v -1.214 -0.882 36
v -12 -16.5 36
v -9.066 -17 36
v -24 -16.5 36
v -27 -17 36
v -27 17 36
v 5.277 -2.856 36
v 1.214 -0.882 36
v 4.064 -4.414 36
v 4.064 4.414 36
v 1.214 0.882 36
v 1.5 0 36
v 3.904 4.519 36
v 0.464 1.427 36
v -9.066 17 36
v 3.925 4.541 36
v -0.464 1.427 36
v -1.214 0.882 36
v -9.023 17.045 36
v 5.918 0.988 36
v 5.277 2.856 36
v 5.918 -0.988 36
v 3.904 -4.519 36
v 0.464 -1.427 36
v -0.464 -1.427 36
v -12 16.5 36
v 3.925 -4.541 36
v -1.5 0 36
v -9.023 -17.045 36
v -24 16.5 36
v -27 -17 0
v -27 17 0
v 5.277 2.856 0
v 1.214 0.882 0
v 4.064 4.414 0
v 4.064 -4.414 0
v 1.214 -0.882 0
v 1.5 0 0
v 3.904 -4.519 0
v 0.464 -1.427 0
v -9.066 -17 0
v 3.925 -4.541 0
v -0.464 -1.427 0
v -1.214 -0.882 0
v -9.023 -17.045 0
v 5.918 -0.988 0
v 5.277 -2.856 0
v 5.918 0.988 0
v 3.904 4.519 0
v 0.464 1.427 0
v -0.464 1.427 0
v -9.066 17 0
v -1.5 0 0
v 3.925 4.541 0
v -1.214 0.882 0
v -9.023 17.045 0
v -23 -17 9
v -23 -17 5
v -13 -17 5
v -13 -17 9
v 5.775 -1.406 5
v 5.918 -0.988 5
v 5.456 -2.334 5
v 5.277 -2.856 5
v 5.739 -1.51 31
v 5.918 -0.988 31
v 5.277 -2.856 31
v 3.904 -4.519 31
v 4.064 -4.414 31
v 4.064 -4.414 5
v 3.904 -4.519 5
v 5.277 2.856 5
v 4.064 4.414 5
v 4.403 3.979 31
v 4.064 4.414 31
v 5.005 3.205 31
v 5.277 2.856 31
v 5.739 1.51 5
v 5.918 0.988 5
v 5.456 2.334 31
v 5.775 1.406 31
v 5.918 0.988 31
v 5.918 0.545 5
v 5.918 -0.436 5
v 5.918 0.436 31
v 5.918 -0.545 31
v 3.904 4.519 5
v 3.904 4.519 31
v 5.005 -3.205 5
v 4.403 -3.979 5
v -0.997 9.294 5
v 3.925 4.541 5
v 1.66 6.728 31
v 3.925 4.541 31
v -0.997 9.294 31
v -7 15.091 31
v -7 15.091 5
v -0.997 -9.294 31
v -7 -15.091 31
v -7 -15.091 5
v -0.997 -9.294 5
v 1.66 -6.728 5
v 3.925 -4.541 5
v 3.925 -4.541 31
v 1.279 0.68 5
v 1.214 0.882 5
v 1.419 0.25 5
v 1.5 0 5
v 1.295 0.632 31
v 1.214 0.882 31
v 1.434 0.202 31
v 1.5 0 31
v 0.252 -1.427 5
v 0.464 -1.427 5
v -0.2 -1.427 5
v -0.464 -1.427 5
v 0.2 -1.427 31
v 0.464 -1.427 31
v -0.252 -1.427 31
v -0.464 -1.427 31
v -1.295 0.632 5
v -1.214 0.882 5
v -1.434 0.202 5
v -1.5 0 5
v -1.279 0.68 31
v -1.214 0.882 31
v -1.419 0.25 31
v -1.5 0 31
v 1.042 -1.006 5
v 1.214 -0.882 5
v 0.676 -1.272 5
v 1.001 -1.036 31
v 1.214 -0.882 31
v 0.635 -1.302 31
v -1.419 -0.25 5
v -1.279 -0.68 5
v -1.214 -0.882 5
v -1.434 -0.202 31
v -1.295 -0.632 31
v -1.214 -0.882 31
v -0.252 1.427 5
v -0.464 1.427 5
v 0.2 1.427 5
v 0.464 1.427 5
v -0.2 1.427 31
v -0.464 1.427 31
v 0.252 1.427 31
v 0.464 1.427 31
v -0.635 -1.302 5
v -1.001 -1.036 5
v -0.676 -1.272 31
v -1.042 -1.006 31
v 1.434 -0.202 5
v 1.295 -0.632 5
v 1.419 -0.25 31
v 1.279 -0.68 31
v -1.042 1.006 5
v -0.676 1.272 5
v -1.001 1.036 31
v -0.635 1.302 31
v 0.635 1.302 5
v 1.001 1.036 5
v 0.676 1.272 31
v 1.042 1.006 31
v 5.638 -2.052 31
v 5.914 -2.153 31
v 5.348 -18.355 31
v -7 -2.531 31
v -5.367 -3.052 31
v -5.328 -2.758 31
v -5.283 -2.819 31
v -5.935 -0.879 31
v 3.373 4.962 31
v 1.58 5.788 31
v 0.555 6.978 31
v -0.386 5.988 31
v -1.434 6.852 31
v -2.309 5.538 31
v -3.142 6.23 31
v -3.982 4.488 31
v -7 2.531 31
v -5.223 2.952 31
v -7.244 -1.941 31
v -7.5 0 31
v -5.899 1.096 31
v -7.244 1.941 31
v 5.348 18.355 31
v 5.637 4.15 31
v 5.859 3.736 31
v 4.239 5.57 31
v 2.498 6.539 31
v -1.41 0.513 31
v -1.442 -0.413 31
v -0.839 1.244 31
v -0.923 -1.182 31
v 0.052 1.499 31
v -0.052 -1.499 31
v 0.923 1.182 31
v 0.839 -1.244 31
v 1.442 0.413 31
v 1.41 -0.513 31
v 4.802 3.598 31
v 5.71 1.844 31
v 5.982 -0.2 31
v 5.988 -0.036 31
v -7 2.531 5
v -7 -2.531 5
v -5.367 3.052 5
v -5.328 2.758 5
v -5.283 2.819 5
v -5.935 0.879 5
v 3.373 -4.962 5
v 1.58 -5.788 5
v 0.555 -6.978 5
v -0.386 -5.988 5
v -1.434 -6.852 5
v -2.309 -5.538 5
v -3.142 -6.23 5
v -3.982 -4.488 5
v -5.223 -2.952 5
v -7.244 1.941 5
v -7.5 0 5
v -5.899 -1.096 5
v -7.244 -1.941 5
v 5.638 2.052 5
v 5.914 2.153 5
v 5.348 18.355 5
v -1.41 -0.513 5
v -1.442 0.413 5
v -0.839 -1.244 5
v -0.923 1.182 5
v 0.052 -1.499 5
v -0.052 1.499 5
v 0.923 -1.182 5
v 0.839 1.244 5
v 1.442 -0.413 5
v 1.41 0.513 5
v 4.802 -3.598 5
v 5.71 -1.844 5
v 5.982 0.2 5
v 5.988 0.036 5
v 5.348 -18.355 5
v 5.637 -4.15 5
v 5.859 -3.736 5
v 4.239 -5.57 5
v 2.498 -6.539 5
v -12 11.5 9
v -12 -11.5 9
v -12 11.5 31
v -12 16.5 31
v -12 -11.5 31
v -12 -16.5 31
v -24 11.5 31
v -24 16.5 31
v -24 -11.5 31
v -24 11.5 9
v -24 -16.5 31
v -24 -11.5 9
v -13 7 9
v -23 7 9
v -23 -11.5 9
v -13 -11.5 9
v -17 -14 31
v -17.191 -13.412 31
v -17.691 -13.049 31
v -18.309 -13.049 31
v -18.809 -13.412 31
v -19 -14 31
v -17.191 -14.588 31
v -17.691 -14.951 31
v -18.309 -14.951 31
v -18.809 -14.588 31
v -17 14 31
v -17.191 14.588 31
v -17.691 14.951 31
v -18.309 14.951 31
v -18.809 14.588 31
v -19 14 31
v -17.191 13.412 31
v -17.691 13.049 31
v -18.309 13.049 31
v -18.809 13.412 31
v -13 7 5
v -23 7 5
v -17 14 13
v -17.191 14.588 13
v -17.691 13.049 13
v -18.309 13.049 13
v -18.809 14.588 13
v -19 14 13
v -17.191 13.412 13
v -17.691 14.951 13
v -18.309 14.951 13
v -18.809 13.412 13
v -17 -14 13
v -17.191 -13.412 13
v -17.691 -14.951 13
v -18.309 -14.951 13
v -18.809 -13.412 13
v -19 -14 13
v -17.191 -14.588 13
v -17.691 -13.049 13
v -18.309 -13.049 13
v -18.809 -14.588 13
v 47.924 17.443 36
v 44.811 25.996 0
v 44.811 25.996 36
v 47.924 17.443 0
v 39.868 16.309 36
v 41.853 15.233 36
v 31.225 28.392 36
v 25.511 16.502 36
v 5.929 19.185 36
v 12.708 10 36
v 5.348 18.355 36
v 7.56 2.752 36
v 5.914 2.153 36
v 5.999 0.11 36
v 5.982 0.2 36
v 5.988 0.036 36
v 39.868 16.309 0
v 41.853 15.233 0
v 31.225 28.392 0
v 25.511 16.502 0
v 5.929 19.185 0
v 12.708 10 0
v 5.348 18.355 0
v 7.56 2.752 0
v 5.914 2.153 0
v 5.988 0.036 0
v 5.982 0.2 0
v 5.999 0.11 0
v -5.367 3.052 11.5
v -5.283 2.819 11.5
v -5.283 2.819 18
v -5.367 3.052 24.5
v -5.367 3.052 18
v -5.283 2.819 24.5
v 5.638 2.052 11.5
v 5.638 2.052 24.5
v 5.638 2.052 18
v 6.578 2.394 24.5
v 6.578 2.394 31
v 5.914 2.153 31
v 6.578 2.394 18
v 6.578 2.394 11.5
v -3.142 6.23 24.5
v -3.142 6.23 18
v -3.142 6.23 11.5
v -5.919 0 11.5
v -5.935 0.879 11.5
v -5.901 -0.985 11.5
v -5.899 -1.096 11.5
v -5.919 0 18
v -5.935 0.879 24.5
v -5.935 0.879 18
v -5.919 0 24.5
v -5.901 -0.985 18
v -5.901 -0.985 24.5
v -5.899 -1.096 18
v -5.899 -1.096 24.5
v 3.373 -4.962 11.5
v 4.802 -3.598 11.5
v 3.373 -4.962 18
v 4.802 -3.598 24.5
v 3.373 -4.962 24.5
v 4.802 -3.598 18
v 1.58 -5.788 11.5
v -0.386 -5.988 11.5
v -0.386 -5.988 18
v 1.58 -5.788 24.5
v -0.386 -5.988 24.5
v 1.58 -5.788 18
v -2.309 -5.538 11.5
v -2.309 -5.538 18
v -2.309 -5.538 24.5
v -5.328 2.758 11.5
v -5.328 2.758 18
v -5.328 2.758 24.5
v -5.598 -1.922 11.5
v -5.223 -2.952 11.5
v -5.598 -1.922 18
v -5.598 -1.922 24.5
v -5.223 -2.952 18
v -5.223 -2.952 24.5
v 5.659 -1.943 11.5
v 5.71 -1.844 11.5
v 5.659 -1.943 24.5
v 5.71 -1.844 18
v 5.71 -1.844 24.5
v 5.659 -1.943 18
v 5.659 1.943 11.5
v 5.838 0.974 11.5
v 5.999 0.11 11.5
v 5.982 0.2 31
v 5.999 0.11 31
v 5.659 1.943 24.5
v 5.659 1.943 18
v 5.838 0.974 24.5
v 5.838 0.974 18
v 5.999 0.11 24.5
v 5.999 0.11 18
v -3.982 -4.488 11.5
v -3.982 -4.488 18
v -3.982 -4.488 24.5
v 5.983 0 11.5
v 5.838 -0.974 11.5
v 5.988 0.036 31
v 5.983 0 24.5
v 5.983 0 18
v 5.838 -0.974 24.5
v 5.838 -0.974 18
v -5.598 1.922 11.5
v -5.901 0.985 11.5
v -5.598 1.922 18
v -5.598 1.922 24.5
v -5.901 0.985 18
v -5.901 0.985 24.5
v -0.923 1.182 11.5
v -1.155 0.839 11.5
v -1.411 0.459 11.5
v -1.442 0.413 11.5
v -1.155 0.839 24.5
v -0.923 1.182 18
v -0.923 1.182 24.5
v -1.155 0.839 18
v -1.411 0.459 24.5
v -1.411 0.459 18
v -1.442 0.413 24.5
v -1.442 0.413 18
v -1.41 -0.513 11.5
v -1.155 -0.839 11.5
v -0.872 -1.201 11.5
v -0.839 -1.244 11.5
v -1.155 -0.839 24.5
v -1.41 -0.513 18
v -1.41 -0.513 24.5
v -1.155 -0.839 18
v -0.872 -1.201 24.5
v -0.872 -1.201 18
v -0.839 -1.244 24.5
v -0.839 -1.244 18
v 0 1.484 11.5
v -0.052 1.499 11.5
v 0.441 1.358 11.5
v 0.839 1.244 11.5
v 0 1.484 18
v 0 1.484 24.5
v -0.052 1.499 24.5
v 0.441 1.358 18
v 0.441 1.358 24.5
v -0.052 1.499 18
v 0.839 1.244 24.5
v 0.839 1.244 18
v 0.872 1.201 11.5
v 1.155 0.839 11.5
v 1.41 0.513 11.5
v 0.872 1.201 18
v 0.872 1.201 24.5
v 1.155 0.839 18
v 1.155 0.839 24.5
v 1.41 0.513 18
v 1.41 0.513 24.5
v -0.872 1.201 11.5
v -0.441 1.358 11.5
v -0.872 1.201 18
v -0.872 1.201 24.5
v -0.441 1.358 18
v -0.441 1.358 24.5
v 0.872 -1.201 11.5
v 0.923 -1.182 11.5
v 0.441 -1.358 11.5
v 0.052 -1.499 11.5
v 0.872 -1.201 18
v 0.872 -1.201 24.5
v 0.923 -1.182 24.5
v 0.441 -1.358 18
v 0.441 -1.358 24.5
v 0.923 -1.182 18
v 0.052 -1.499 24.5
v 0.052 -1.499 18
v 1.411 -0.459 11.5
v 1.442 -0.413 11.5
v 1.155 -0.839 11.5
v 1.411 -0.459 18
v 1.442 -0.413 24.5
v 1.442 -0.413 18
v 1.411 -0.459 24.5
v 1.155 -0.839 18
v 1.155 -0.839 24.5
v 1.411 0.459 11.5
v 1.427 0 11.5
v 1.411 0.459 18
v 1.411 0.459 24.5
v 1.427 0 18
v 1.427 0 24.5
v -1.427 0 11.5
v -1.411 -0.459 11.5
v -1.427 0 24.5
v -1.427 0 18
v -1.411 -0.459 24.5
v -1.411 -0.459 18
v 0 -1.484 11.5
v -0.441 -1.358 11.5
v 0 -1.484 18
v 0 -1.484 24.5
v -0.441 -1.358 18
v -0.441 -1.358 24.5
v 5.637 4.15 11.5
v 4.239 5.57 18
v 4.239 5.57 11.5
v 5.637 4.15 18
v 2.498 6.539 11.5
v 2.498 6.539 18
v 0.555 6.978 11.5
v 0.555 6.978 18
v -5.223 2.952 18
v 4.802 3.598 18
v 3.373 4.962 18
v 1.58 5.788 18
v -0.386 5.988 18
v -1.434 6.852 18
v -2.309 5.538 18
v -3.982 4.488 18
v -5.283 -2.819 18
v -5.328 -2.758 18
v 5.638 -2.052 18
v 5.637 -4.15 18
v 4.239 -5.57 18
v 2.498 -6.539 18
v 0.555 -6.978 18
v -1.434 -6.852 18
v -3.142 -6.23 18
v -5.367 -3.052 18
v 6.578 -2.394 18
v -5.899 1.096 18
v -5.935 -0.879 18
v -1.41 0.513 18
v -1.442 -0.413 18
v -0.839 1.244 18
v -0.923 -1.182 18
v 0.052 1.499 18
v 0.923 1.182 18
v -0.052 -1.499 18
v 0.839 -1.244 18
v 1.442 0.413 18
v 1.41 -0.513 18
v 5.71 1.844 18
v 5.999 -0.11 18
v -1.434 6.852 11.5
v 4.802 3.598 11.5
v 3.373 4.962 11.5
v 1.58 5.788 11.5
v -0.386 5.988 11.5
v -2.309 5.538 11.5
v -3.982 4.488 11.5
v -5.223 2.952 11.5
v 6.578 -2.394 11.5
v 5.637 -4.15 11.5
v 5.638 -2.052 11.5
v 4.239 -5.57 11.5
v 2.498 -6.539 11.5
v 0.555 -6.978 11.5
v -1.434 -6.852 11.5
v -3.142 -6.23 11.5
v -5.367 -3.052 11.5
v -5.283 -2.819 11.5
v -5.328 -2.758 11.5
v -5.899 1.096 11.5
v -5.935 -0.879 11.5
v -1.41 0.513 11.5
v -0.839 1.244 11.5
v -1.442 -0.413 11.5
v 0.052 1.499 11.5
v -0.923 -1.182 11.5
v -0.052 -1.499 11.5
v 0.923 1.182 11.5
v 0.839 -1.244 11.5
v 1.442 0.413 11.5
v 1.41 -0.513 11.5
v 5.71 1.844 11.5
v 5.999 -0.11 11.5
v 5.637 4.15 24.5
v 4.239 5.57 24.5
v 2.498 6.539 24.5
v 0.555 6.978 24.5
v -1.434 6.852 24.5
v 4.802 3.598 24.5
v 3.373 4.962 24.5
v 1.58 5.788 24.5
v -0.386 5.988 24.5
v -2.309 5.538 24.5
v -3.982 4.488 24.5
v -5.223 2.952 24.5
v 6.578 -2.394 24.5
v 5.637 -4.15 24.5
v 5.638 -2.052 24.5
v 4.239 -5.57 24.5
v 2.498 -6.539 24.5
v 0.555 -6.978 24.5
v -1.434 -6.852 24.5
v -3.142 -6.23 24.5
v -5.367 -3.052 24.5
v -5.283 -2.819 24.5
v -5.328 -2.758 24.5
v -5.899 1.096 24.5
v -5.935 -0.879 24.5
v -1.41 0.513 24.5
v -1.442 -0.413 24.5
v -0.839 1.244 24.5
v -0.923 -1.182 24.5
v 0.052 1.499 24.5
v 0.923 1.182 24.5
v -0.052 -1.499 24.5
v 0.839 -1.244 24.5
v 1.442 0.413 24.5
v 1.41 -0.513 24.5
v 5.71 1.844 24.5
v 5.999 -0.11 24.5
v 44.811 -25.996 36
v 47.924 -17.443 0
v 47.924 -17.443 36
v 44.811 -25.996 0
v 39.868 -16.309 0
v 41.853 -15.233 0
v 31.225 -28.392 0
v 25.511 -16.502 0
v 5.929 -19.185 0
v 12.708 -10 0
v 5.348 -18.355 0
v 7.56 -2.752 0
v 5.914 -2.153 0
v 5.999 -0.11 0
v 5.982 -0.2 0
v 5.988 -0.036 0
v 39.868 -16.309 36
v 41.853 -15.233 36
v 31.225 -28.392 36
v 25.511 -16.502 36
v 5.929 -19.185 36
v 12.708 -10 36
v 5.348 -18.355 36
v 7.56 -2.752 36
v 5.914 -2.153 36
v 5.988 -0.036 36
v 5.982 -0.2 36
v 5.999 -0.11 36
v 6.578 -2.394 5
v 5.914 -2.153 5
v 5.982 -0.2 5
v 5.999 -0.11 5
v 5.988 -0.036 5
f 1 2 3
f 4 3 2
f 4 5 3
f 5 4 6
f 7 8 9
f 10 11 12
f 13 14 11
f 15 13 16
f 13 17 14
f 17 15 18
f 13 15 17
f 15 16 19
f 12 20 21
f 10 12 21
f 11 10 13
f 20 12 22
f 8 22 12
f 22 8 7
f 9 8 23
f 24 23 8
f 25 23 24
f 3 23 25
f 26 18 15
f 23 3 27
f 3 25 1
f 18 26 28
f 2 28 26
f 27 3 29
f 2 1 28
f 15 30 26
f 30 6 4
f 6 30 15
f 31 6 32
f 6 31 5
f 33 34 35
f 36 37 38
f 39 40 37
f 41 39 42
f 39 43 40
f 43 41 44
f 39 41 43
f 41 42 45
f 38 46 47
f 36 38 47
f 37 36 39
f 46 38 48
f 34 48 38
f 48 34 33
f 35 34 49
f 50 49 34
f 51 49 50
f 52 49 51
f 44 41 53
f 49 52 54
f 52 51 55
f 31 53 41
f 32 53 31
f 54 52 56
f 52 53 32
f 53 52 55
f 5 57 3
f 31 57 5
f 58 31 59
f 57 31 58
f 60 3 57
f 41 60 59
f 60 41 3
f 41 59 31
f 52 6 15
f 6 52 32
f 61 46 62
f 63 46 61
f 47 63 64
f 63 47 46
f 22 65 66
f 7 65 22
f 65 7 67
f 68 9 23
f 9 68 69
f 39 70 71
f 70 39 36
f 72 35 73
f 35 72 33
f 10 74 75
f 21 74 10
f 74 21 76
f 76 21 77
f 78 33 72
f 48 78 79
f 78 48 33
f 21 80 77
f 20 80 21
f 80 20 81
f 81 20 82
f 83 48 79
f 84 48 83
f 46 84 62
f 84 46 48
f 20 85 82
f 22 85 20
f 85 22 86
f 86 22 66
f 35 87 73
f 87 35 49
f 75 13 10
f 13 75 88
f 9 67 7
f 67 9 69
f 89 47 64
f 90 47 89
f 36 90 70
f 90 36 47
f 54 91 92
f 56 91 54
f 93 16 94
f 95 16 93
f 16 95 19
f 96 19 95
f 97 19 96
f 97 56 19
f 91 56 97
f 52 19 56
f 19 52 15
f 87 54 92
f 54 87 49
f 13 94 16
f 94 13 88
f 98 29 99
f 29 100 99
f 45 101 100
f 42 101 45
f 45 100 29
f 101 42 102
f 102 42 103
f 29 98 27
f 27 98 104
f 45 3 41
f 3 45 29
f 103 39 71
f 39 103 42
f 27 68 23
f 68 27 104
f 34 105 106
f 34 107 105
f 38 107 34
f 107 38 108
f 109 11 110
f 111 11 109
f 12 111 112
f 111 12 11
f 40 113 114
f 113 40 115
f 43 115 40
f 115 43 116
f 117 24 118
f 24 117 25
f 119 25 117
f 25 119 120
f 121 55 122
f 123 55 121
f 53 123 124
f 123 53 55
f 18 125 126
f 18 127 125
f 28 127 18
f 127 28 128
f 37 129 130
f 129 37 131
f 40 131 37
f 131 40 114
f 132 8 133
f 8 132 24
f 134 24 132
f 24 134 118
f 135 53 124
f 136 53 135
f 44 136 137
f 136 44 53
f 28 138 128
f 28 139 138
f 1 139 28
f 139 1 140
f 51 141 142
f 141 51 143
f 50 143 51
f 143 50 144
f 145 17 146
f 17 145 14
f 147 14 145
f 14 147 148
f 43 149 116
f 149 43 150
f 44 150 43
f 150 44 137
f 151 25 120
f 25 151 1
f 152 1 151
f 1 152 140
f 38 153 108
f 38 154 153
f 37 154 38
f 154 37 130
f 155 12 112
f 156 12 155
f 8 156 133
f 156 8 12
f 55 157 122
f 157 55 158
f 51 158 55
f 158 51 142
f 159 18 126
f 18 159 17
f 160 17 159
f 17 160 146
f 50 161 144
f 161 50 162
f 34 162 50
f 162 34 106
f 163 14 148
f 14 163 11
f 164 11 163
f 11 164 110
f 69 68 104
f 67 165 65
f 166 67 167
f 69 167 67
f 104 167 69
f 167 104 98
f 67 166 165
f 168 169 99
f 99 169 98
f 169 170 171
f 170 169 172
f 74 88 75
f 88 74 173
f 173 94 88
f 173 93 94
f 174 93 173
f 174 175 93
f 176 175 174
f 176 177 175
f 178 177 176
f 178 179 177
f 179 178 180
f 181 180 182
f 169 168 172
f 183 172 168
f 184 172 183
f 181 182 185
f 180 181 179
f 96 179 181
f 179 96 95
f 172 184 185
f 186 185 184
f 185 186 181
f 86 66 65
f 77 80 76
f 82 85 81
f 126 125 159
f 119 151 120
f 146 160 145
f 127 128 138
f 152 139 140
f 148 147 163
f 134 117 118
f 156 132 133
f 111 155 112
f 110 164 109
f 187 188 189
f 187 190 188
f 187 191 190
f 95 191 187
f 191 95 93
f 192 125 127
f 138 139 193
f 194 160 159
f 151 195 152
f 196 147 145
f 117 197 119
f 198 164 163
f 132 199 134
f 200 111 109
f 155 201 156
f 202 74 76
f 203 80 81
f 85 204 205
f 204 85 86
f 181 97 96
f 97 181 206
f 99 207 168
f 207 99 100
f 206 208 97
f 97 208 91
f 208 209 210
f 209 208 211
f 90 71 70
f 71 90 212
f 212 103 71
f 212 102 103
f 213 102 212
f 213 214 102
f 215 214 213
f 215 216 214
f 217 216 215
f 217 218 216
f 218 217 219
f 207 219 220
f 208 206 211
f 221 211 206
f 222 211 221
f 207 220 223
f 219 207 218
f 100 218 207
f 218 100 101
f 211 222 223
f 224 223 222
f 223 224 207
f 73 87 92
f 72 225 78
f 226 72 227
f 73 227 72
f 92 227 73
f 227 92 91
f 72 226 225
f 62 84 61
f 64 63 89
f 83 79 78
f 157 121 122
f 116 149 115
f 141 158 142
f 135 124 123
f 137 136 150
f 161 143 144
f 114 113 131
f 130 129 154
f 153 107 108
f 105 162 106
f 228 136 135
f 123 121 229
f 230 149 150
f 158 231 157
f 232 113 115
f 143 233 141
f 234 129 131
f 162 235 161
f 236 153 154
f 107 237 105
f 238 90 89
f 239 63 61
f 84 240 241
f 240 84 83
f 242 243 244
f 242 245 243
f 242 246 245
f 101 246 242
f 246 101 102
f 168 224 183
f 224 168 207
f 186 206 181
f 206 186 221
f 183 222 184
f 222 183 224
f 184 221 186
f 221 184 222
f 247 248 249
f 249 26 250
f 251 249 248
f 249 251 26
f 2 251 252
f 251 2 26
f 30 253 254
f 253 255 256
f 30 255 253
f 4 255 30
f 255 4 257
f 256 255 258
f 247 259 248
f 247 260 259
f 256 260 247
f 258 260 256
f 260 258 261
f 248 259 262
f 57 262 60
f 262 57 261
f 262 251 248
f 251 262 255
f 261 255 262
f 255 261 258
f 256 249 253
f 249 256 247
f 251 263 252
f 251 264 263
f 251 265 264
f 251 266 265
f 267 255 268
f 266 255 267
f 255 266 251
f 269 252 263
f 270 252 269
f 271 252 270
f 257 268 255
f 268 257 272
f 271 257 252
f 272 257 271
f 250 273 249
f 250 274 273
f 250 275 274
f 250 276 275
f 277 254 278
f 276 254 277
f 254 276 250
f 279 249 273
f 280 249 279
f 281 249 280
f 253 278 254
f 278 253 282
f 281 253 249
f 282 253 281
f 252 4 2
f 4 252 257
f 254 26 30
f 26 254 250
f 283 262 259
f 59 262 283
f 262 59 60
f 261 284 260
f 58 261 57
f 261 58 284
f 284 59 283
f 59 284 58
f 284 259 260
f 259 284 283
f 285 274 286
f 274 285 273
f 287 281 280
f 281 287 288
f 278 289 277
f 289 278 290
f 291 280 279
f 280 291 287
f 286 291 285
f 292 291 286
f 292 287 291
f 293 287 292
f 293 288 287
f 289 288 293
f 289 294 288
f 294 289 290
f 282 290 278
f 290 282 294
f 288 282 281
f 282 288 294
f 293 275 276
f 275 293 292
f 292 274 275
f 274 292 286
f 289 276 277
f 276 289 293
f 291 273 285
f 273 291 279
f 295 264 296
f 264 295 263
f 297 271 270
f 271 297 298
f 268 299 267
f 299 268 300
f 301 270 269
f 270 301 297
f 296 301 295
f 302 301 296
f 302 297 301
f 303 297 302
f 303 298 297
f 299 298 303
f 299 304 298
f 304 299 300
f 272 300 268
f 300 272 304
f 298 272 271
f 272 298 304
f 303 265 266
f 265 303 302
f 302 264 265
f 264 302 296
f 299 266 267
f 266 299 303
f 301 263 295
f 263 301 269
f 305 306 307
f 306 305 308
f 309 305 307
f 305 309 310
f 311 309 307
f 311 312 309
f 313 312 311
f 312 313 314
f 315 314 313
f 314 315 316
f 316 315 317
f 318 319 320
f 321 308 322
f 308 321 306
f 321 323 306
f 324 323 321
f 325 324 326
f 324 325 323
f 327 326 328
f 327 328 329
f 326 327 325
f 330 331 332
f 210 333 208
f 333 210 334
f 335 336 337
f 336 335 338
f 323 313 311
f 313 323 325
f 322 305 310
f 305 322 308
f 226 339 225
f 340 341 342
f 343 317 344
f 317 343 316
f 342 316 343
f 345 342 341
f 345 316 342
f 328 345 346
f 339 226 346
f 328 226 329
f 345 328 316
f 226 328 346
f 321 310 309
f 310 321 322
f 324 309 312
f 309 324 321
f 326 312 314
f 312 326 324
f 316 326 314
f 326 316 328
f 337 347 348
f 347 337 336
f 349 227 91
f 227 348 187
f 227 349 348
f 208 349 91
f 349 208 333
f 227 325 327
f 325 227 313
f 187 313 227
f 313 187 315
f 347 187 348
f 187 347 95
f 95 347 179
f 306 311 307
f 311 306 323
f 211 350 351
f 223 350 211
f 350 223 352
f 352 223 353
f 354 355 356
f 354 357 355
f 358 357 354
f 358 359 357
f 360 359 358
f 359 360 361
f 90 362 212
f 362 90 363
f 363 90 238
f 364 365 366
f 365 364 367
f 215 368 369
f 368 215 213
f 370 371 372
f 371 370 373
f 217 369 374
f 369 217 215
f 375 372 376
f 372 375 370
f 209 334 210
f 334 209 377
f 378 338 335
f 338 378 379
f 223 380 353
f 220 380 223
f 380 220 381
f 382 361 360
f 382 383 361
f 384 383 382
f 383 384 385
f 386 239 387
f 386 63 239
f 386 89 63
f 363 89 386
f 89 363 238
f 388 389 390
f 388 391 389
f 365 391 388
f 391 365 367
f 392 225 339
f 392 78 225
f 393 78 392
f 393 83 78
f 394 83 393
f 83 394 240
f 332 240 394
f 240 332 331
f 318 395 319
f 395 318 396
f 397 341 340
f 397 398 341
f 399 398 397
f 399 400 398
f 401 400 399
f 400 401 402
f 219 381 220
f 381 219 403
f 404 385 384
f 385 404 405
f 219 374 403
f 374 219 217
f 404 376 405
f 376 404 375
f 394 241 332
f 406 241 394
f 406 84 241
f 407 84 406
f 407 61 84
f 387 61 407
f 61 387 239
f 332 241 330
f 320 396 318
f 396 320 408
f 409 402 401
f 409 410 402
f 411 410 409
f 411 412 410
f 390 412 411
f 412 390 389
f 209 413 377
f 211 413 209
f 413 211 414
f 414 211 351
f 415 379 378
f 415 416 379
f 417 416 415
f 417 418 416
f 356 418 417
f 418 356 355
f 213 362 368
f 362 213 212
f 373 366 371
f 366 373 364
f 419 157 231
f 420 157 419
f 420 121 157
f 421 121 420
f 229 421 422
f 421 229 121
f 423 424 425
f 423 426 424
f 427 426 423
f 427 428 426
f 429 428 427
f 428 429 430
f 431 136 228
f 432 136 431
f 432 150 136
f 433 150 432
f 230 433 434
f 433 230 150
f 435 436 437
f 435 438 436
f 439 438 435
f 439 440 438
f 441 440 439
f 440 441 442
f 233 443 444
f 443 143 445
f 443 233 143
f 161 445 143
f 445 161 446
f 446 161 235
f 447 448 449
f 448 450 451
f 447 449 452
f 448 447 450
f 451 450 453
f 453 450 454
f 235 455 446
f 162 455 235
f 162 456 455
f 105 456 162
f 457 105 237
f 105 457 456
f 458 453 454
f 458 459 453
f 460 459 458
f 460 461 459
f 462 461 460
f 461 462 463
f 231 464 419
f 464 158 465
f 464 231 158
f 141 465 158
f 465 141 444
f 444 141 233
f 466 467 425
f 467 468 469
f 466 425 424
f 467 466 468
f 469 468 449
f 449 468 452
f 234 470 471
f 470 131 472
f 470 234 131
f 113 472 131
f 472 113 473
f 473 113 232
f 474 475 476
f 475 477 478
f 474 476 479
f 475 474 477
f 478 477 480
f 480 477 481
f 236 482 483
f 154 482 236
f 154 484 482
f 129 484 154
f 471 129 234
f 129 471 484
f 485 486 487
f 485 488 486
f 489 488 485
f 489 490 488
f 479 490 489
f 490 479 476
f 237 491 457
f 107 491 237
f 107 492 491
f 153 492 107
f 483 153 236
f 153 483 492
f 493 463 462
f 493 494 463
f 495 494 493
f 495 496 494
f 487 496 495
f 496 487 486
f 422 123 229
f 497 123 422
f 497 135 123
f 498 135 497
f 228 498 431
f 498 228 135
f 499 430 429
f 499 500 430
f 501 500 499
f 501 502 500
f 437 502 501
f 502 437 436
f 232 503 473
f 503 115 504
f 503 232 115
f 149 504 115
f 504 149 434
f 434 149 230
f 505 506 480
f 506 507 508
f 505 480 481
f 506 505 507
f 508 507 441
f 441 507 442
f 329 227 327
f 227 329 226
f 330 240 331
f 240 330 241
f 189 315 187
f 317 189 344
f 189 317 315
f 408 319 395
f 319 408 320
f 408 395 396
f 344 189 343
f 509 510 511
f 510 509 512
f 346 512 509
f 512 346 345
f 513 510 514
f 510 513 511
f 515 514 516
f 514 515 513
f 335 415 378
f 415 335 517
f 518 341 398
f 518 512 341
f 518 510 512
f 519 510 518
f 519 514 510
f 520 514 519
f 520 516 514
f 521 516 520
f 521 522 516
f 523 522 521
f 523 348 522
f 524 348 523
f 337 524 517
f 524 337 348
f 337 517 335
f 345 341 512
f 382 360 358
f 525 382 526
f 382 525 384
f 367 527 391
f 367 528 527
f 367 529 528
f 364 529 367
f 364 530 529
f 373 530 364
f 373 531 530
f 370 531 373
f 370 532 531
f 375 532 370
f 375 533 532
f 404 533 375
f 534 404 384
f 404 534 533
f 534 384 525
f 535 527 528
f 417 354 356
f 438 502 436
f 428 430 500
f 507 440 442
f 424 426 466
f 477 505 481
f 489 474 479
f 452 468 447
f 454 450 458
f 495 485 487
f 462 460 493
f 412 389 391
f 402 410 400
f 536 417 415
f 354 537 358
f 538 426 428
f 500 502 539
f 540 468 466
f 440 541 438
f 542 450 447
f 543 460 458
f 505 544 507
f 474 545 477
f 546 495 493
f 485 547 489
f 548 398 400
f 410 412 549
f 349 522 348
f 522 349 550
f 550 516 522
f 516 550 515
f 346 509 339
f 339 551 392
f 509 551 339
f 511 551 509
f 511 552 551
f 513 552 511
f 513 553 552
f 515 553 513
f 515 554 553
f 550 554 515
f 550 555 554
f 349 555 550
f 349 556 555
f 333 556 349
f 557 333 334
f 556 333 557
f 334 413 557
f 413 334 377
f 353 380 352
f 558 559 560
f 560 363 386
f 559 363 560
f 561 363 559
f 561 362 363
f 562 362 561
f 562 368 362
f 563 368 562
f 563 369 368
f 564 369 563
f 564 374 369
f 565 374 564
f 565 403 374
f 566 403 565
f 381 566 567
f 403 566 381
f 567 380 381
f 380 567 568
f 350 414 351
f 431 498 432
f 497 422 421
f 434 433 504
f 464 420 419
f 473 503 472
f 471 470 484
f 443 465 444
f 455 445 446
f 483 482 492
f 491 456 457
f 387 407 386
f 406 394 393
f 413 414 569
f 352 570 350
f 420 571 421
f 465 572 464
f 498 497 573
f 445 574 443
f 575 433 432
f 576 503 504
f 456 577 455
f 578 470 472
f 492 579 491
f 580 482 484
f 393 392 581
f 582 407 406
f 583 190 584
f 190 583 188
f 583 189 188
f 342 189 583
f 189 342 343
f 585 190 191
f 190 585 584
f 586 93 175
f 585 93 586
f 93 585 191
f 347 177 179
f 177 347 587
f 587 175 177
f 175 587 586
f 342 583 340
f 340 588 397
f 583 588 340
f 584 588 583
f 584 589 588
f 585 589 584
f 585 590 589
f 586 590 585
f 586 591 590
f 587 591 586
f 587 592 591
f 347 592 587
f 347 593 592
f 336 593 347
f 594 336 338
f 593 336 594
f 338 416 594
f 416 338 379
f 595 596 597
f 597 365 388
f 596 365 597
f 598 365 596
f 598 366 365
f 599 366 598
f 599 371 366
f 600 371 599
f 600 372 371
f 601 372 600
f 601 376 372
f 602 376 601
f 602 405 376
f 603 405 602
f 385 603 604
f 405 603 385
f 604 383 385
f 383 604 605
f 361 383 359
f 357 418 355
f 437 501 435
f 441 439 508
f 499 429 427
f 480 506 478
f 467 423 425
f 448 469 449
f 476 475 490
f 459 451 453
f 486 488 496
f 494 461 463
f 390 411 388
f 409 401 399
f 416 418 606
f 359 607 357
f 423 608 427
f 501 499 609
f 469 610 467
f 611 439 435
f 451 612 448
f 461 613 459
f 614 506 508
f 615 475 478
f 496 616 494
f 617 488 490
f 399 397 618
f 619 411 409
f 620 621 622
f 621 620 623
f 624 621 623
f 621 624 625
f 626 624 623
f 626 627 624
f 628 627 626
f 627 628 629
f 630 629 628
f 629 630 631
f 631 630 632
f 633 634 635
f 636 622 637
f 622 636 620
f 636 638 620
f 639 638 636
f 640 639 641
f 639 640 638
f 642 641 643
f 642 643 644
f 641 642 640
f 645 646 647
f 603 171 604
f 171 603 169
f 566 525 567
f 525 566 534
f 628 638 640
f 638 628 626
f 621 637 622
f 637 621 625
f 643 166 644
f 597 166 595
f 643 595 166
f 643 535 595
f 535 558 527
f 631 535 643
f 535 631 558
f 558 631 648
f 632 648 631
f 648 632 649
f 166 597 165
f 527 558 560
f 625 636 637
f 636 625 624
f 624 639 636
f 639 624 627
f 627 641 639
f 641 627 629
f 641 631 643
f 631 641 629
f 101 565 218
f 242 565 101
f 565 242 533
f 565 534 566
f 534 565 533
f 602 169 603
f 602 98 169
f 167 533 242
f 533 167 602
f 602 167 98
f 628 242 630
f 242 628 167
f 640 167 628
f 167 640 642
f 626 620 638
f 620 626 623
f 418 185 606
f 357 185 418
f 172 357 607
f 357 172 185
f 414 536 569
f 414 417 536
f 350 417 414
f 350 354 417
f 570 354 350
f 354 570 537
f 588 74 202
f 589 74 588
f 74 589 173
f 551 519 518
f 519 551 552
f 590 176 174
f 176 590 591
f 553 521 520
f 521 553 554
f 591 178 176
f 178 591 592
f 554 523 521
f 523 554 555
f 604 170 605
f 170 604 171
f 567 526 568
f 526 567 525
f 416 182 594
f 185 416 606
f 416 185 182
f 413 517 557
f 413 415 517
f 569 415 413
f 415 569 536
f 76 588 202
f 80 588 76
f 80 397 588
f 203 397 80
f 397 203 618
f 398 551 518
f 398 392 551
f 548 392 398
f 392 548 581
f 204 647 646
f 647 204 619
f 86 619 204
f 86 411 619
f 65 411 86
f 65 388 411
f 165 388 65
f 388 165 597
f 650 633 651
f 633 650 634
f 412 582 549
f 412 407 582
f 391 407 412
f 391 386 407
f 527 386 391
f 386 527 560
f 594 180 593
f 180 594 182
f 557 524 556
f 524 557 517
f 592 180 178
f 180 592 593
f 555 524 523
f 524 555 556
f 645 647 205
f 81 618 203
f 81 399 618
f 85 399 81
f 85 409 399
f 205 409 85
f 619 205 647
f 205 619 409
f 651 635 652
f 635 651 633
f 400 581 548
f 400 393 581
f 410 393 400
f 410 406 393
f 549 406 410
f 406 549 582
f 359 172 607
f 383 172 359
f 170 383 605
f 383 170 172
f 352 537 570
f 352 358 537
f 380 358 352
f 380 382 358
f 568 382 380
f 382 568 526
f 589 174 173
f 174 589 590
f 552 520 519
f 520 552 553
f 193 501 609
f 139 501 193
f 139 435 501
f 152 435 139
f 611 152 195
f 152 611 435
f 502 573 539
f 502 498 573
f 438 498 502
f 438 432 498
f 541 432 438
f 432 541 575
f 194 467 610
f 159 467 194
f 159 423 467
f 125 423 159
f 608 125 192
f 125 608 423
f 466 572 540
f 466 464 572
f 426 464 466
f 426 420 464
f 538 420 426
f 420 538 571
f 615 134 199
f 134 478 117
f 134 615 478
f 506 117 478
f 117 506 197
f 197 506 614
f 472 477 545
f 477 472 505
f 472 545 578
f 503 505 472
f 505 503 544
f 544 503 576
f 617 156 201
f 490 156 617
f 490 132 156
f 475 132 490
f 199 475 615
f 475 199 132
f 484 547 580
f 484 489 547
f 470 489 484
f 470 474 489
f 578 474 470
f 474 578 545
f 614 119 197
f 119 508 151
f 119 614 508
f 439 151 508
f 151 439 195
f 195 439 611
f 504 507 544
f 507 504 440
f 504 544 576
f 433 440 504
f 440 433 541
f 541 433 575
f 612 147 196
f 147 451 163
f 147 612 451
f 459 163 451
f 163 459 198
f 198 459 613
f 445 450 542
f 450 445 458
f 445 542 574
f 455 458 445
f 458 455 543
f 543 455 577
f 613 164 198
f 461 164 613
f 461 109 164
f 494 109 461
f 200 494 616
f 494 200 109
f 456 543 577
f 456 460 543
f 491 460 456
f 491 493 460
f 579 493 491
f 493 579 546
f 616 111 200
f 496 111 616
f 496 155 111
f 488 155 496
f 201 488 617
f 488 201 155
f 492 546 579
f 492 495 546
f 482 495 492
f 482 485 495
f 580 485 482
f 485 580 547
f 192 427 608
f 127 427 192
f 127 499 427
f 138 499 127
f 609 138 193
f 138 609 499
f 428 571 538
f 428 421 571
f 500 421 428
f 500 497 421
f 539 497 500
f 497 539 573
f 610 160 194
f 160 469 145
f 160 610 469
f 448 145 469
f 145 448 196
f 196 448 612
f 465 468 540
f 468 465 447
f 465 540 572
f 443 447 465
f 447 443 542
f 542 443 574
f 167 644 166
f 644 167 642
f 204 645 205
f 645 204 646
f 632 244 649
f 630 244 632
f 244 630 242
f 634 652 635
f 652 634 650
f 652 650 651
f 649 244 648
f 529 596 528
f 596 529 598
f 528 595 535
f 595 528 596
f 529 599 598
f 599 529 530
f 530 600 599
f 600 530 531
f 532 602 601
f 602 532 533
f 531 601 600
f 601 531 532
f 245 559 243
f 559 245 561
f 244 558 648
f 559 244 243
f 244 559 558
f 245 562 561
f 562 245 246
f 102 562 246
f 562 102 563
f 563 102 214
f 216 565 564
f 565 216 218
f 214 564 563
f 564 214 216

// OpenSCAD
module base(){union(){
difference(){
	union(){
		cube([36,34,18]);
		translate([0,17,27])rotate([0,90,0])cylinder(r=6, h=36);

		translate([0,16.5,2])rotate([46,0,0])cube([36,18,23]);
		mirror([0,1,0])translate([0,-17.5,2])rotate([46,0,0])cube([36,18,23]);
	}
		translate([-1,17,27])rotate([0,90,0])cylinder(r=1.5, h=38, $fn=10);
		translate([5,0,20])cube([26,40,40]);
		translate([5,17,27])rotate([0,90,0])cylinder(r=7.5, h=26);
		translate([36-27,5.5,3])cube([36,23,12]);
		translate([36-5,0.5,3])cube([36,33,12]);
		translate([5,10,4])cube([4,36,10]);
		translate([13,3,9])rotate([0,90,0])cylinder(r=1, h=38, $fn=10);
		translate([13,31,9])rotate([0,90,0])cylinder(r=1, h=38, $fn=10);
}

//SOPORTE
/*
		translate([0,16.5,2])rotate([46,0,0])translate([0,5,21.5])cube([36,13,1.5]);
mirror([0,-1,0])translate([0,-17.5,2])rotate([46,0,0])translate([0,5,21.5])cube([36,13,1.5]);
		translate([0,17,31.5])rotate([0,90,0])cylinder(r=1.5, h=36, $fn=10);
/**/
}
}

module pinza(){
difference(){
	union(){
		difference(){
			translate([-4,0,0])cube([55,16,36]);
			translate([26,-23,-1])cylinder(r=30, h=38,$fn=13);
			translate([-20,-6.5,-1])rotate([0,0,35])cube([75,21,38]);
			translate([20,27,-1])rotate([0,0,-30])cube([75,21,38]);
		}
		cylinder(r=6, h=36);
	}
	translate([0,0,-1])cylinder(r=1.5, h=38, $fn=10);

	translate([-9,-5,-1])rotate([0,0,-18])cube([13,50,6]);
	translate([-9,-5,31])rotate([0,0,-18])cube([13,50,5]);
	
	translate([0,0,11.5])cylinder(r=7, h=6.5);
	translate([0,0,24.5])cylinder(r=7, h=6.5);

}
}

translate([-27,17,0])rotate([0,-90,180])base();
color("red",1)rotate([0,0,20])pinza();
color("blue",1)translate([0,0,36])rotate([180,0,-20])pinza();
